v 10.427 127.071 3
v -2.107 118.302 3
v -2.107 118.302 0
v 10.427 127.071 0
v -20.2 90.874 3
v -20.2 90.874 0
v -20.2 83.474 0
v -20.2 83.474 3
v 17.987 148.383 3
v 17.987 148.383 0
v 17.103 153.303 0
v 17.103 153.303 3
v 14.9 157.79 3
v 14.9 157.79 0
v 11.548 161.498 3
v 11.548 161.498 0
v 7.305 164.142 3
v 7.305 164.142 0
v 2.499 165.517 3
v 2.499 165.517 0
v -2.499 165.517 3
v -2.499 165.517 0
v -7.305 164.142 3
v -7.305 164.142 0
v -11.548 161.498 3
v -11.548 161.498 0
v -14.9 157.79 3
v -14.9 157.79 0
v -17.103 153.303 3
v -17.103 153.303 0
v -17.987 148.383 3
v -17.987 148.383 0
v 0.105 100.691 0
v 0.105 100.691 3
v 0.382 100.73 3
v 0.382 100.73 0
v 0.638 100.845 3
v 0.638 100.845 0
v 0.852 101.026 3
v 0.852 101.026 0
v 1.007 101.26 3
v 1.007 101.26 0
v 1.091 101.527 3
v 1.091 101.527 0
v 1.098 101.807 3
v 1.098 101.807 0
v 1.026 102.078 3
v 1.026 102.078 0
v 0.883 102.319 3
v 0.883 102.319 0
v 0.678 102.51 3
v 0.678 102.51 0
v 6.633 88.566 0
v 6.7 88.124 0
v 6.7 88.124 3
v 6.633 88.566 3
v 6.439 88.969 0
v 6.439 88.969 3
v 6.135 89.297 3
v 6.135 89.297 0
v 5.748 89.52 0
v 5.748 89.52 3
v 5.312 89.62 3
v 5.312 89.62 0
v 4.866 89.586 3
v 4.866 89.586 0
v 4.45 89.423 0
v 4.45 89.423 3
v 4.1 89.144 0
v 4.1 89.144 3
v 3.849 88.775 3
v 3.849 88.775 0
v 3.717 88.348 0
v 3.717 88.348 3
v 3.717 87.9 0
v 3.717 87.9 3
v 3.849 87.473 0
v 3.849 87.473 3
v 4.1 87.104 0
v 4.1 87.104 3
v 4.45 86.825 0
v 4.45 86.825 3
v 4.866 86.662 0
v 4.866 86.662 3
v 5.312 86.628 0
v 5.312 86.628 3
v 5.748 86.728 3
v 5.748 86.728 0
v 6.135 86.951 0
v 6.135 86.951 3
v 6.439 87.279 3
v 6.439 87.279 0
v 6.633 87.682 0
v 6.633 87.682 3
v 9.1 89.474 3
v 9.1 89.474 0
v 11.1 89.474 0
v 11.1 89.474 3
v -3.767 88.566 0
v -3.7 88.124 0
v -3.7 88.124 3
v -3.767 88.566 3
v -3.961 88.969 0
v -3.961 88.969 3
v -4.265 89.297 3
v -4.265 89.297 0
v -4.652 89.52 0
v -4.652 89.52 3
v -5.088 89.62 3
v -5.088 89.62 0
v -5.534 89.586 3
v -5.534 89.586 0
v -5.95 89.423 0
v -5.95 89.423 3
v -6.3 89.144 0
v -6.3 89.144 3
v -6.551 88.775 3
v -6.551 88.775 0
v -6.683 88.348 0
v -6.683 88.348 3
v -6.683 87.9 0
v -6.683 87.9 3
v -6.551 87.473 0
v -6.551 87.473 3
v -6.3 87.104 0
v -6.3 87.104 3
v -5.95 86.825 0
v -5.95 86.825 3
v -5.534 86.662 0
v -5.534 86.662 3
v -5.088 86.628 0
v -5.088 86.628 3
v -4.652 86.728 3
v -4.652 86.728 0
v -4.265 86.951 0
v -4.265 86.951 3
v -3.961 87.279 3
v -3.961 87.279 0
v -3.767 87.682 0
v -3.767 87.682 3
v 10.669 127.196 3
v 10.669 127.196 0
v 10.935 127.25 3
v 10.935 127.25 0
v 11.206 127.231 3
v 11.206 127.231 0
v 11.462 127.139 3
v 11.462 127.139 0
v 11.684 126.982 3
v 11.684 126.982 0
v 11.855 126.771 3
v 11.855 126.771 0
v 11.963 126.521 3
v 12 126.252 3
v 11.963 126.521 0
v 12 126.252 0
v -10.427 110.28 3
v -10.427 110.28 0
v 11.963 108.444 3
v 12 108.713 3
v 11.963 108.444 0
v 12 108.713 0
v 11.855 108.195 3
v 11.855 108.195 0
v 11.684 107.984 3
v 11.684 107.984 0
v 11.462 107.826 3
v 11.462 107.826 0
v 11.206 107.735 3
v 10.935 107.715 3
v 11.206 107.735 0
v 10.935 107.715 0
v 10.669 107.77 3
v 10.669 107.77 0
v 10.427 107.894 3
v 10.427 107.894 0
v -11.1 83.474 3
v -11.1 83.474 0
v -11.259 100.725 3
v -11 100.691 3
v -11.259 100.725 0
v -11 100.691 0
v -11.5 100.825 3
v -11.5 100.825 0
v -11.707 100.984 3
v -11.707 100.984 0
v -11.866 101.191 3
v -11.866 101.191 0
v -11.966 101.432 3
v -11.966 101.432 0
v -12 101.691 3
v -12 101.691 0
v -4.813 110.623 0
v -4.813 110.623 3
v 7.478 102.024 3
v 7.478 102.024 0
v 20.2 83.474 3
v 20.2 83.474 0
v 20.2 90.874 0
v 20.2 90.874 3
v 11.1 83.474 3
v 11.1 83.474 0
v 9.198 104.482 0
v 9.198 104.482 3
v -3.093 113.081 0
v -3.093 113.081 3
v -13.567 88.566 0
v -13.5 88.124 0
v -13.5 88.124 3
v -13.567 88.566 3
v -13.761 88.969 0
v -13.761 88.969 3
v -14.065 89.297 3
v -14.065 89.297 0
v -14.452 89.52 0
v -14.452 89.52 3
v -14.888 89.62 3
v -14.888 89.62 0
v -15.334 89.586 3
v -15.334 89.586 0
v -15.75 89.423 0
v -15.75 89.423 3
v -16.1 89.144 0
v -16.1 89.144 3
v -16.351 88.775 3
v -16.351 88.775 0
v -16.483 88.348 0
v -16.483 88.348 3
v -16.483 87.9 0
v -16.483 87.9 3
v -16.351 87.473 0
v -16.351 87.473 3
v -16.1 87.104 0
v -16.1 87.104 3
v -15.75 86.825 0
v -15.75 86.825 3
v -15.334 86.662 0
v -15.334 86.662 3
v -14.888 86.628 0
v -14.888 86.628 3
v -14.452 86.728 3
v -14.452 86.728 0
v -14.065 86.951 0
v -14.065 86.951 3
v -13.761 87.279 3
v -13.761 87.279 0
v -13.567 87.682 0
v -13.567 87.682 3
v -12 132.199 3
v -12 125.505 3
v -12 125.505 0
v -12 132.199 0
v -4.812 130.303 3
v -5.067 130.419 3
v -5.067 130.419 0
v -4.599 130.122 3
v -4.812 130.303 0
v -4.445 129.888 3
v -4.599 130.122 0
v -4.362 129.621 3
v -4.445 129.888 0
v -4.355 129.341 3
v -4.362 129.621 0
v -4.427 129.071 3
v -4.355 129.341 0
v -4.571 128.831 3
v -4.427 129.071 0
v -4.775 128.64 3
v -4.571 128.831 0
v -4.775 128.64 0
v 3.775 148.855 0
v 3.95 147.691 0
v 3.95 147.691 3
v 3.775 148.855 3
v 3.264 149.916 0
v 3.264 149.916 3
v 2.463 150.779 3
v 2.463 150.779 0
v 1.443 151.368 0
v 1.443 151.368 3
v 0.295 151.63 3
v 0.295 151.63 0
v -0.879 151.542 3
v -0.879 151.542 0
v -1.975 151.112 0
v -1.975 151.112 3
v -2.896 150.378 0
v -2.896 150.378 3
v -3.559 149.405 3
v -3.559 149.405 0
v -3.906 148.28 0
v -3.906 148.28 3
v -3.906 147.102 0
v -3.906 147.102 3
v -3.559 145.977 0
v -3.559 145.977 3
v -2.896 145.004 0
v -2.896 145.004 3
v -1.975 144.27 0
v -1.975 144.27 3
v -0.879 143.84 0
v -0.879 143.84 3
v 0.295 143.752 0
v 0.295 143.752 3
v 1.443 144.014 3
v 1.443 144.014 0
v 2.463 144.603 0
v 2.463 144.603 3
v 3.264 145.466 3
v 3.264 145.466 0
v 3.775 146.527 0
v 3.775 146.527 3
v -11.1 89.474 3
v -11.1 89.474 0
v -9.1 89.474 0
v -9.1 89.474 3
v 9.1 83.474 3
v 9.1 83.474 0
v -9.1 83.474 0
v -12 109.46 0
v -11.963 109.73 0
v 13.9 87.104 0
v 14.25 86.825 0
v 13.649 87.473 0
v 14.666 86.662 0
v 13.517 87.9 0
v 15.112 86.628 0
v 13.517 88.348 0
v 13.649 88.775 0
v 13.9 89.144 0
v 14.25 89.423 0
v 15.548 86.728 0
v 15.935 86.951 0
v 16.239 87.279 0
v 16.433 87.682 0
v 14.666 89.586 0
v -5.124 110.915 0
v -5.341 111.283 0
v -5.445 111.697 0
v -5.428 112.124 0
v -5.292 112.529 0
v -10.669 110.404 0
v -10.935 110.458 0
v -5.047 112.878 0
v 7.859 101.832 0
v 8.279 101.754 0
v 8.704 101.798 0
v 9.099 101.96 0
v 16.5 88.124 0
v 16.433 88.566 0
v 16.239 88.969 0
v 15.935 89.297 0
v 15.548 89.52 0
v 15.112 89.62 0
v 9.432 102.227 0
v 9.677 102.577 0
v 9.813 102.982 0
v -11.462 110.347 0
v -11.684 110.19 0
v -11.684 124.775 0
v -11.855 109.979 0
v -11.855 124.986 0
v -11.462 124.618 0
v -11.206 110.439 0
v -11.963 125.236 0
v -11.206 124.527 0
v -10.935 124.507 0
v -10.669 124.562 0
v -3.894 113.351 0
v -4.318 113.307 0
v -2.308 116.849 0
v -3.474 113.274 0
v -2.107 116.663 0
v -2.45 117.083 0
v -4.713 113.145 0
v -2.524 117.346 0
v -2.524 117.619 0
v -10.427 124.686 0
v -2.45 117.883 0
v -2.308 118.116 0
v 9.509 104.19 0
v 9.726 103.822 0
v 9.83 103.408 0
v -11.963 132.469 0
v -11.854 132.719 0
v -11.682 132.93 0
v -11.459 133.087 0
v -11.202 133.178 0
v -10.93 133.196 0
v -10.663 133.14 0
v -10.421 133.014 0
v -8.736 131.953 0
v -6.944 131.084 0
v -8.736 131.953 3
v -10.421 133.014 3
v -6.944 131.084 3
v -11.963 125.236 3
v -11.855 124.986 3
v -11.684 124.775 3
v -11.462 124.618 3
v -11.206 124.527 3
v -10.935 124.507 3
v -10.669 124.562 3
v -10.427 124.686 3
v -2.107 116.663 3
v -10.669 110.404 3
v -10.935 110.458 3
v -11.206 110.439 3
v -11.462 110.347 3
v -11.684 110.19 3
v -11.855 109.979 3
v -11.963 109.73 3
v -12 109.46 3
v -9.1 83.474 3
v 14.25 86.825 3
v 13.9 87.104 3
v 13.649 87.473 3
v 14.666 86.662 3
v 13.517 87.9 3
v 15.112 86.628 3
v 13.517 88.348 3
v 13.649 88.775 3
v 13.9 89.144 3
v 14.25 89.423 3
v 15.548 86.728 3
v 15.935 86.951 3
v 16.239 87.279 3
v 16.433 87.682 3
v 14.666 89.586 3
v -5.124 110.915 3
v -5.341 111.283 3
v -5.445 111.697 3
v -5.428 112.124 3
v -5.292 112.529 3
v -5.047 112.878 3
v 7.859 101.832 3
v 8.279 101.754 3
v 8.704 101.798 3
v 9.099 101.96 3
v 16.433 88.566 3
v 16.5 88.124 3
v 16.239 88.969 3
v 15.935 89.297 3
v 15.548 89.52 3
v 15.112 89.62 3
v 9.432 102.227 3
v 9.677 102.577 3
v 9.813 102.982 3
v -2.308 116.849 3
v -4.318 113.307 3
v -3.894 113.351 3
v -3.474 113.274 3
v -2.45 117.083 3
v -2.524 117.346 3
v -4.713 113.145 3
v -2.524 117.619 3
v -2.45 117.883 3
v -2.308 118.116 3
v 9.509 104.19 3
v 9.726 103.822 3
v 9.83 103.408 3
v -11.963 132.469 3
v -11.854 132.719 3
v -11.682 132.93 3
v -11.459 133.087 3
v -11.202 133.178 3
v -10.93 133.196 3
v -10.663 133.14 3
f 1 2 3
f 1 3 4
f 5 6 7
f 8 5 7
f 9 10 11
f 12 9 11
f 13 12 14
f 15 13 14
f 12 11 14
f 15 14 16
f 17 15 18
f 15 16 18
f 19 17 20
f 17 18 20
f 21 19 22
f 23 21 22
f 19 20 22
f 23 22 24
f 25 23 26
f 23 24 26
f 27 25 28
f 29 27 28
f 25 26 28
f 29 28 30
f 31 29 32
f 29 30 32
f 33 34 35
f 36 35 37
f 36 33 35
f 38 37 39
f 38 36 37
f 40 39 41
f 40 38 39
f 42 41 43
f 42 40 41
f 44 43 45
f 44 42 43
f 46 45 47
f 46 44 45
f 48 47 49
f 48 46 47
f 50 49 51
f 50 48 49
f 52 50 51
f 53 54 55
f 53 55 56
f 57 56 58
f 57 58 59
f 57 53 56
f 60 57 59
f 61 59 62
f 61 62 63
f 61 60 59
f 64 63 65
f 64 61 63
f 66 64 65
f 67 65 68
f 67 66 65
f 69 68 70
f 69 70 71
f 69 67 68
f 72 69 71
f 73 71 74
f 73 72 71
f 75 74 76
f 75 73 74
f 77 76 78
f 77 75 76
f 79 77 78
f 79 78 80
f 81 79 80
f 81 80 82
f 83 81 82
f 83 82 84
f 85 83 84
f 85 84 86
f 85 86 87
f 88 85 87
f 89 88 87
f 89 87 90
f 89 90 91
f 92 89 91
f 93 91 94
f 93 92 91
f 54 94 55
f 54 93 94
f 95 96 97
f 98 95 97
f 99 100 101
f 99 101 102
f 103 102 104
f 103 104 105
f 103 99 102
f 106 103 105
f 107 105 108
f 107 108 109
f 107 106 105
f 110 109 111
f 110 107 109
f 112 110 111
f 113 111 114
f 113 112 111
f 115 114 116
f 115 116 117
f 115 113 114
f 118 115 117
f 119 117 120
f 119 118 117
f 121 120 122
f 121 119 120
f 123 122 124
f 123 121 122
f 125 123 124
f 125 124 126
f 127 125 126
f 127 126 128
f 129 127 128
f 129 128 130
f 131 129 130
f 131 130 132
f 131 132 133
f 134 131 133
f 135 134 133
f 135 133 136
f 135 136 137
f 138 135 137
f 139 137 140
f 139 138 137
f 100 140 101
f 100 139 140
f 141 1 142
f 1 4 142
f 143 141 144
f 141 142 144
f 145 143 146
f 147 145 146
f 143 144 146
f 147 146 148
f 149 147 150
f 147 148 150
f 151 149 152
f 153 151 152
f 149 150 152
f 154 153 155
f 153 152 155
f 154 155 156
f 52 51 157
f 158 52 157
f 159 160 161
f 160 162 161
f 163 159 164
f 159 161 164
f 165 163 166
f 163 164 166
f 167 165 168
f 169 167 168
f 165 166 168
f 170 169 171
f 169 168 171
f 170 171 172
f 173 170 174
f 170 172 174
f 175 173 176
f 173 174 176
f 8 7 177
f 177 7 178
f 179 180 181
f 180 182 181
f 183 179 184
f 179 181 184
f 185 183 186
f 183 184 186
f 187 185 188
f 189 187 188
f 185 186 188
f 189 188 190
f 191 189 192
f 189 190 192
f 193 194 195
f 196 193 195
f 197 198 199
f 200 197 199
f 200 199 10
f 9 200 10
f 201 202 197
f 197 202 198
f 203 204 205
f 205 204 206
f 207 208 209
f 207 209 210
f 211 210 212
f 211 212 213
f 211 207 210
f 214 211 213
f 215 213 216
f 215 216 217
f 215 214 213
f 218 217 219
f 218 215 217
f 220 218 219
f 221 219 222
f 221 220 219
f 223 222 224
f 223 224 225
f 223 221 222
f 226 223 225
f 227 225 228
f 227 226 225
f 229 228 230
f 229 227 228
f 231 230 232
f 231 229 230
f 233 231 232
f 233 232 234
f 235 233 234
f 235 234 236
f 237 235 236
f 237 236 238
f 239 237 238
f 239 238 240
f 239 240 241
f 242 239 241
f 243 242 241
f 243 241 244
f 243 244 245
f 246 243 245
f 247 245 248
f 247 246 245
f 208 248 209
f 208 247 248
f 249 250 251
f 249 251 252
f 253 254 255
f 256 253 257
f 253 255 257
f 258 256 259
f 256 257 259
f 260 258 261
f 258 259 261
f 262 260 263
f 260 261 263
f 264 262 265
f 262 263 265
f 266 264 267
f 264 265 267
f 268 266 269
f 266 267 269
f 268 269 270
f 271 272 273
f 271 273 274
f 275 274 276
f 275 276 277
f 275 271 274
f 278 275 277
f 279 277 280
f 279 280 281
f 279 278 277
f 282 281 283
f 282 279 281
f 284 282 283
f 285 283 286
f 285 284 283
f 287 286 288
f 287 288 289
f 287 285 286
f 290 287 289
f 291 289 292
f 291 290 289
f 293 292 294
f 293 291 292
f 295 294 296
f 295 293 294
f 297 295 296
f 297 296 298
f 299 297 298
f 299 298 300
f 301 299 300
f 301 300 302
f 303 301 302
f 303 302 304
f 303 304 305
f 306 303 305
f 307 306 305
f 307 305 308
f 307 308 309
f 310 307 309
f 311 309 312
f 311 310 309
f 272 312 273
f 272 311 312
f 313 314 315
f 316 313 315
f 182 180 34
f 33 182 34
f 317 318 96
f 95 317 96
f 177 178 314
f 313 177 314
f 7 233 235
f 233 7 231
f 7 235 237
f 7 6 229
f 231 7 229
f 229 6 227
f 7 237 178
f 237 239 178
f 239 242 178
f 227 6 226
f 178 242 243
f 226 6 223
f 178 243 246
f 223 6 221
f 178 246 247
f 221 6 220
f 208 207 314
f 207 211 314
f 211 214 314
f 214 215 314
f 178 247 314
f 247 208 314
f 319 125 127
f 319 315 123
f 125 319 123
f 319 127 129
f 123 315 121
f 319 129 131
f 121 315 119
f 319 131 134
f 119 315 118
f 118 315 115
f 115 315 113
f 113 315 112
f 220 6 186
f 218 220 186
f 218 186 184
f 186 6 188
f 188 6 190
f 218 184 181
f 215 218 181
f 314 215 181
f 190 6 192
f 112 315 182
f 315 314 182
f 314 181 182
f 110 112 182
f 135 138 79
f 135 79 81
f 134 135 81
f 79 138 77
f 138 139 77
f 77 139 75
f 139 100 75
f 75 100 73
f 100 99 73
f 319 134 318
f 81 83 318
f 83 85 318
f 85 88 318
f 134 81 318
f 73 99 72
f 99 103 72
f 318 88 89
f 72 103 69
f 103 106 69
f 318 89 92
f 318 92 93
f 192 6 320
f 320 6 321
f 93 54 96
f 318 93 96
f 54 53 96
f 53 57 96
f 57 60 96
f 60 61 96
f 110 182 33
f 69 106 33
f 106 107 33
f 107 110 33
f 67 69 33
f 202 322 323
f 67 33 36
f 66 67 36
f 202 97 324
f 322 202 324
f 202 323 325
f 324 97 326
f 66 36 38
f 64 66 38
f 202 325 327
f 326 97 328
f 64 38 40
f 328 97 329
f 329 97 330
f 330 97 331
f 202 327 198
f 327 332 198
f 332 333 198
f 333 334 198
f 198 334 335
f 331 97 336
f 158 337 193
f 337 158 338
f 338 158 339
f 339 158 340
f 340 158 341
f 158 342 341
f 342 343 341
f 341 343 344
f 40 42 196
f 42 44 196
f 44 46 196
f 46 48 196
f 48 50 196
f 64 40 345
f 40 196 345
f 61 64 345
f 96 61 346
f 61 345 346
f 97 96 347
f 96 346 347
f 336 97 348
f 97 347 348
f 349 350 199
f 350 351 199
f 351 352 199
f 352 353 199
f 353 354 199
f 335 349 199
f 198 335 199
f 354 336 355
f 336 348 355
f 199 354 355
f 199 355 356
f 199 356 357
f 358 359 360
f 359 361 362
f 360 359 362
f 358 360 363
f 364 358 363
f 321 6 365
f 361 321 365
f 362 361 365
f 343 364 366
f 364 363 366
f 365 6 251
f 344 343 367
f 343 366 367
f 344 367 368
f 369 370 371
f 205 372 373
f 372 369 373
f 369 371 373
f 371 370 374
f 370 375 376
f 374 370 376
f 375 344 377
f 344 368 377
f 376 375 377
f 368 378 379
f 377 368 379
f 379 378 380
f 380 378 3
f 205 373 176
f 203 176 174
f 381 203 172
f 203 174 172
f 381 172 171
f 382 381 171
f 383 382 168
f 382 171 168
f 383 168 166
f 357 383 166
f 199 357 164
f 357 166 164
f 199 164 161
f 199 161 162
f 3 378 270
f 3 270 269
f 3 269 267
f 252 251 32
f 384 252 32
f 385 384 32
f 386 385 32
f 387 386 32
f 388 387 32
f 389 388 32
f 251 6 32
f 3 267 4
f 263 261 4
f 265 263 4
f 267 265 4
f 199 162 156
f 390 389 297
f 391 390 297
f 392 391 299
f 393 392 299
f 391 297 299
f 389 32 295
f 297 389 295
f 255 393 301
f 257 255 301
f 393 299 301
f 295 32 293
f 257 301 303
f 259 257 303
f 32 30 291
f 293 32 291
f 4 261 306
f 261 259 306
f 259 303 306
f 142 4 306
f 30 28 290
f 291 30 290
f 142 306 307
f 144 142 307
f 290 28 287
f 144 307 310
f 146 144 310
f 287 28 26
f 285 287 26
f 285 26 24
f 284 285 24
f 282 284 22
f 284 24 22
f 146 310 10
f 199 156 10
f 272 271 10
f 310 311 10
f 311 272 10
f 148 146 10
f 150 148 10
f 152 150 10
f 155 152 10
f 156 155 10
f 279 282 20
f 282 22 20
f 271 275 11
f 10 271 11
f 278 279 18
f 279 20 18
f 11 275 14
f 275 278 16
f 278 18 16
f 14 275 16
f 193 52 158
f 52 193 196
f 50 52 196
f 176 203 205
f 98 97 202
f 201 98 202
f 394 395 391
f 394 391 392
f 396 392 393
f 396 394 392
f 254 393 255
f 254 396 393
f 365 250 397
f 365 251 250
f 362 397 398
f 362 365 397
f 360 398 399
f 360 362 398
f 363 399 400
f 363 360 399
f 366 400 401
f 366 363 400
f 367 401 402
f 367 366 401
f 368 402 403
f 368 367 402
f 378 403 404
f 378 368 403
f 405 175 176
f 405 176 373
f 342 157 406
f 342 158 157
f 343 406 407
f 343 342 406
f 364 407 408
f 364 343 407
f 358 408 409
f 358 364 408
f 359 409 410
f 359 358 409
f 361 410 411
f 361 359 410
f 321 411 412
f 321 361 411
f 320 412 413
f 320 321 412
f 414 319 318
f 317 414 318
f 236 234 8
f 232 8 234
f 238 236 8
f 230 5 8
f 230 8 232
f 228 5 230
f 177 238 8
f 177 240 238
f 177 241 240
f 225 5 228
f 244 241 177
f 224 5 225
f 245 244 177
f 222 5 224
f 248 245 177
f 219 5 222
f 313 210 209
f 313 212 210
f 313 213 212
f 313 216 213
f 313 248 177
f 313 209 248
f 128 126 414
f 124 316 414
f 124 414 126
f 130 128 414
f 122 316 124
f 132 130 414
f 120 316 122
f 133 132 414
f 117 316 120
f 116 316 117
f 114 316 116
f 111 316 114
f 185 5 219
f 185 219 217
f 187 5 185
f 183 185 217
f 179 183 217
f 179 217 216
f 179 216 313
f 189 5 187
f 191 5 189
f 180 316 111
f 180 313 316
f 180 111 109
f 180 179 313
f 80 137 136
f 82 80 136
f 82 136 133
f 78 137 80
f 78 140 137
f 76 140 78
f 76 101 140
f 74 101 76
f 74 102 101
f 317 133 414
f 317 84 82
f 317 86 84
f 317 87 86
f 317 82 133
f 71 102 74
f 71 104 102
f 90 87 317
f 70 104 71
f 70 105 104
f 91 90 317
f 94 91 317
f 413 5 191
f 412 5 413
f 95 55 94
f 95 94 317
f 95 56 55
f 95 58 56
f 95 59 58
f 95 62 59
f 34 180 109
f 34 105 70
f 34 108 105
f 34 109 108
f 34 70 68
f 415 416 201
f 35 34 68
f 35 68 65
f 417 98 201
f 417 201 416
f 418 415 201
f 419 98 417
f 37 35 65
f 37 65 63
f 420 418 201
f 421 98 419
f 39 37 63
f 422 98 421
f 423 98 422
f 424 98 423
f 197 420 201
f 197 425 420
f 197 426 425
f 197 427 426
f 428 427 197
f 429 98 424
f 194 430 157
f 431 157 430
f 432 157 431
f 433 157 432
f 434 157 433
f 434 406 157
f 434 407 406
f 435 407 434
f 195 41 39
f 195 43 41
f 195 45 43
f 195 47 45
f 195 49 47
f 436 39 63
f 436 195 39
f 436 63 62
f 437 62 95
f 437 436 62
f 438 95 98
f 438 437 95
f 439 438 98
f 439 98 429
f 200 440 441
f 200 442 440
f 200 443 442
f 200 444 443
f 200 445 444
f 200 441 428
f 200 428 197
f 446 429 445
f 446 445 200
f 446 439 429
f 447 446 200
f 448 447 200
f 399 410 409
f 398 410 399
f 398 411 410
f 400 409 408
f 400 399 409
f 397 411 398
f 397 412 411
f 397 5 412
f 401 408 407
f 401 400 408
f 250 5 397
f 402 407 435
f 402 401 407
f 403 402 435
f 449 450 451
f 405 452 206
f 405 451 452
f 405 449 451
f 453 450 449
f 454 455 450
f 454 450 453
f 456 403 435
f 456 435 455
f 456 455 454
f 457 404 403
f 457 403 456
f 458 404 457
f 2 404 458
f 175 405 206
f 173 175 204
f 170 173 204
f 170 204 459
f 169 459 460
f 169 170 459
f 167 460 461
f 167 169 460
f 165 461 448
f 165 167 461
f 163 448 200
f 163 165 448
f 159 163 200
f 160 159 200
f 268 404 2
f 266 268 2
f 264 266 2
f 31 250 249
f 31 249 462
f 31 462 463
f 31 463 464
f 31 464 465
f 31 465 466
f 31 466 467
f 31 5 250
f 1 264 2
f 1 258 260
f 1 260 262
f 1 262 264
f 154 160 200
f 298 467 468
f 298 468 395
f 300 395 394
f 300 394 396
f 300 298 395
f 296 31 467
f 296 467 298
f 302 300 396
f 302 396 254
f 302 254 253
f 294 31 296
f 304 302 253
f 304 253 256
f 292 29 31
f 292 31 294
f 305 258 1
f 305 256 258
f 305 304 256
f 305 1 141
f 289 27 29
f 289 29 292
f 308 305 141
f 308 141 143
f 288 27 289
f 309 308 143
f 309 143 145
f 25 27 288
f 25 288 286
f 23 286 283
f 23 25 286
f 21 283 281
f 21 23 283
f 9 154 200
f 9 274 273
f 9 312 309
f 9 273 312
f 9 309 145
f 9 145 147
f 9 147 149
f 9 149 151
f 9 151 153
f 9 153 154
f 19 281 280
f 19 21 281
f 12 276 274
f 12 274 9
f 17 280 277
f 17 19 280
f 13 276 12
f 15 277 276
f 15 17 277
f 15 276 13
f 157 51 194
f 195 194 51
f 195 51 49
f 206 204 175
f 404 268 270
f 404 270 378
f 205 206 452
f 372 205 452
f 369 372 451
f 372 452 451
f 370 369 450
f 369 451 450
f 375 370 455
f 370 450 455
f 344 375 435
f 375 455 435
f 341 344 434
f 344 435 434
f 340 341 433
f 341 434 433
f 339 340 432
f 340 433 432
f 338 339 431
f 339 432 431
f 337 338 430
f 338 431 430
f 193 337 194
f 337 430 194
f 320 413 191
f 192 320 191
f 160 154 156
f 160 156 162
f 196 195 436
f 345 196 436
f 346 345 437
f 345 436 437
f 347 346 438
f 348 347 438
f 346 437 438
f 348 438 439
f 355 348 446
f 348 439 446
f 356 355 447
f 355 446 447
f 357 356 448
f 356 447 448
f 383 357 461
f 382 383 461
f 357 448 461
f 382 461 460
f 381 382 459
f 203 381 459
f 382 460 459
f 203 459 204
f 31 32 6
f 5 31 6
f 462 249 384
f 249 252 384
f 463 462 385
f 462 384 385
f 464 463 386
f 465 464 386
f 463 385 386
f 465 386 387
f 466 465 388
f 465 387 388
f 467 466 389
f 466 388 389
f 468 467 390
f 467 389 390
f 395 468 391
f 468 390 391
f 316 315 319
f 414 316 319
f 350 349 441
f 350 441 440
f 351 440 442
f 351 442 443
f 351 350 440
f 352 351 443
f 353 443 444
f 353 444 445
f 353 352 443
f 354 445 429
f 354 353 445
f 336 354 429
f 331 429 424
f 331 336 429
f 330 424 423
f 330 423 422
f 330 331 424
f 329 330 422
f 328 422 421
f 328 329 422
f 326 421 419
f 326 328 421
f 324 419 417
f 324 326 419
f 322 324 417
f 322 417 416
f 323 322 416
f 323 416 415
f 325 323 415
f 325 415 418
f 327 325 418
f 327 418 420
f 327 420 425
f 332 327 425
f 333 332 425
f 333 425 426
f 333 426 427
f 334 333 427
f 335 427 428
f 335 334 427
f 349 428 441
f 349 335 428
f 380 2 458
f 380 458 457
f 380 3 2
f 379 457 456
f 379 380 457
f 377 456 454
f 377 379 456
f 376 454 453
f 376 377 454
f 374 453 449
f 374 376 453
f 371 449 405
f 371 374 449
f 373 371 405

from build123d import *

# Parameters (mm, degrees)
SKETCH1_R               = 1.5
SKETCH1_R_2             = 3.95
MAIN_BODY_LINK_B1_DEPTH = 3
CUT_EXTRUDE1_REACH      = 168.945
PULLEYIDLER_DEPTH       = 3
FILLET1_R               = 1


with BuildPart() as part:
    # Sketch1 → Main Body Link B1 (new body)
    with BuildSketch(Plane.XY):
        with BuildLine():
            Line((0, 83.474052381), (9.1, 83.474052381))
            Line((9.1, 83.474052381), (9.1, 89.474052381))
            Line((9.1, 89.474052381), (11.1, 89.474052381))
            Line((11.1, 89.474052381), (11.1, 83.474052381))
            Line((11.1, 83.474052381), (20.2, 83.474052381))
            Line((20.2, 83.474052381), (20.2, 90.874052381))
            Line((20.2, 90.874052381), (17.986683974, 148.383116621))
            ThreePointArc((17.986683974, 148.383116621), (0, 165.690874165), (-17.986683974, 148.383116621))
            Line((-17.986683974, 148.383116621), (-20.2, 90.874052381))
            Line((-20.2, 90.874052381), (-20.2, 83.474052381))
            Line((-20.2, 83.474052381), (-11.1, 83.474052381))
            Line((-11.1, 83.474052381), (-11.1, 89.474052381))
            Line((-11.1, 89.474052381), (-9.1, 89.474052381))
            Line((-9.1, 89.474052381), (-9.1, 83.474052381))
            Line((-9.1, 83.474052381), (0, 83.474052381))
        make_face()
        with Locations((5.2, 88.124052381)):
            Circle(SKETCH1_R, mode=Mode.SUBTRACT)
        with Locations((15, 88.124052381)):
            Circle(SKETCH1_R, mode=Mode.SUBTRACT)
        with Locations((-15, 88.124052381)):
            Circle(SKETCH1_R, mode=Mode.SUBTRACT)
        with Locations((-5.2, 88.124052381)):
            Circle(SKETCH1_R, mode=Mode.SUBTRACT)
        with Locations((0, 147.690874165)):
            Circle(SKETCH1_R_2, mode=Mode.SUBTRACT)
    extrude(amount=MAIN_BODY_LINK_B1_DEPTH)

    # Sketch2 → Cut-Extrude1 (cut, up to next)
    with BuildSketch(Plane.XY.offset(3), mode=Mode.PRIVATE) as cut_extrude1_sk1:
        Polygon((-3.278172542, 117.482670232), (12, 128.172168466), (12, 106.793171999), align=None)
    cut_extrude1_tool1 = extrude(cut_extrude1_sk1.sketch, amount=-CUT_EXTRUDE1_REACH, mode=Mode.PRIVATE) & part.part
    # Sketch2 → Cut-Extrude1 (cut, up to next)
    with BuildSketch(Plane.XY.offset(3), mode=Mode.PRIVATE) as cut_extrude1_sk2:
        with BuildLine():
            ThreePointArc((-12, 134.2744663), (-7.774454217, 131.456408925), (-2.929911079, 129.930929878))
            Line((-2.929911079, 129.930929878), (-12, 123.584968066))
            Line((-12, 123.584968066), (-12, 134.2744663))
        make_face()
    cut_extrude1_tool2 = extrude(cut_extrude1_sk2.sketch, amount=-CUT_EXTRUDE1_REACH, mode=Mode.PRIVATE) & part.part
    # Sketch2 → Cut-Extrude1 (cut, up to next)
    with BuildSketch(Plane.XY.offset(3), mode=Mode.PRIVATE) as cut_extrude1_sk3:
        Polygon((-12, 111.380372399), (-12, 100.690874165), (3.278172542, 100.690874165), align=None)
    cut_extrude1_tool3 = extrude(cut_extrude1_sk3.sketch, amount=-CUT_EXTRUDE1_REACH, mode=Mode.PRIVATE) & part.part
    add(cut_extrude1_tool1.solids().sort_by_distance((6.907276, 117.48267, 3))[0], mode=Mode.SUBTRACT)
    add(cut_extrude1_tool2.solids().sort_by_distance((-9.12997, 128.978342, 3))[0], mode=Mode.SUBTRACT)
    add(cut_extrude1_tool3.solids().sort_by_distance((-6.907276, 104.25404, 3))[0], mode=Mode.SUBTRACT)

    # Sketch3 → PulleyIdler (cut)
    with BuildSketch(Plane.XY.offset(3)):
        with BuildLine():
            Line((-4.812543936, 110.623218529), (7.477908291, 102.024103222))
            ThreePointArc((7.477908291, 102.024103222), (9.566865044, 102.393236914), (9.197731352, 104.482193668))
            Line((9.197731352, 104.482193668), (-3.092720875, 113.081308975))
            ThreePointArc((-3.092720875, 113.081308975), (-5.181677628, 112.712175283), (-4.812543936, 110.623218529))
        make_face()
    extrude(amount=-PULLEYIDLER_DEPTH, mode=Mode.SUBTRACT)

    # Fillet1
    fillet1_edges = [part.edges().sort_by_distance(p)[0] for p in [
        (-3.278172542, 117.482670232, 1.5),
        (12, 128.172168466, 1.5),
        (12, 106.793171999, 1.5),
        (-12, 134.2744663, 1.5),
        (-2.929911079, 129.930929878, 1.5),
        (-12, 123.584968066, 1.5),
        (-12, 111.380372399, 1.5),
        (3.278172542, 100.690874165, 1.5),
        (-12, 100.690874165, 1.5),
    ]]
    fillet(fillet1_edges, radius=FILLET1_R)


solid = part.part
